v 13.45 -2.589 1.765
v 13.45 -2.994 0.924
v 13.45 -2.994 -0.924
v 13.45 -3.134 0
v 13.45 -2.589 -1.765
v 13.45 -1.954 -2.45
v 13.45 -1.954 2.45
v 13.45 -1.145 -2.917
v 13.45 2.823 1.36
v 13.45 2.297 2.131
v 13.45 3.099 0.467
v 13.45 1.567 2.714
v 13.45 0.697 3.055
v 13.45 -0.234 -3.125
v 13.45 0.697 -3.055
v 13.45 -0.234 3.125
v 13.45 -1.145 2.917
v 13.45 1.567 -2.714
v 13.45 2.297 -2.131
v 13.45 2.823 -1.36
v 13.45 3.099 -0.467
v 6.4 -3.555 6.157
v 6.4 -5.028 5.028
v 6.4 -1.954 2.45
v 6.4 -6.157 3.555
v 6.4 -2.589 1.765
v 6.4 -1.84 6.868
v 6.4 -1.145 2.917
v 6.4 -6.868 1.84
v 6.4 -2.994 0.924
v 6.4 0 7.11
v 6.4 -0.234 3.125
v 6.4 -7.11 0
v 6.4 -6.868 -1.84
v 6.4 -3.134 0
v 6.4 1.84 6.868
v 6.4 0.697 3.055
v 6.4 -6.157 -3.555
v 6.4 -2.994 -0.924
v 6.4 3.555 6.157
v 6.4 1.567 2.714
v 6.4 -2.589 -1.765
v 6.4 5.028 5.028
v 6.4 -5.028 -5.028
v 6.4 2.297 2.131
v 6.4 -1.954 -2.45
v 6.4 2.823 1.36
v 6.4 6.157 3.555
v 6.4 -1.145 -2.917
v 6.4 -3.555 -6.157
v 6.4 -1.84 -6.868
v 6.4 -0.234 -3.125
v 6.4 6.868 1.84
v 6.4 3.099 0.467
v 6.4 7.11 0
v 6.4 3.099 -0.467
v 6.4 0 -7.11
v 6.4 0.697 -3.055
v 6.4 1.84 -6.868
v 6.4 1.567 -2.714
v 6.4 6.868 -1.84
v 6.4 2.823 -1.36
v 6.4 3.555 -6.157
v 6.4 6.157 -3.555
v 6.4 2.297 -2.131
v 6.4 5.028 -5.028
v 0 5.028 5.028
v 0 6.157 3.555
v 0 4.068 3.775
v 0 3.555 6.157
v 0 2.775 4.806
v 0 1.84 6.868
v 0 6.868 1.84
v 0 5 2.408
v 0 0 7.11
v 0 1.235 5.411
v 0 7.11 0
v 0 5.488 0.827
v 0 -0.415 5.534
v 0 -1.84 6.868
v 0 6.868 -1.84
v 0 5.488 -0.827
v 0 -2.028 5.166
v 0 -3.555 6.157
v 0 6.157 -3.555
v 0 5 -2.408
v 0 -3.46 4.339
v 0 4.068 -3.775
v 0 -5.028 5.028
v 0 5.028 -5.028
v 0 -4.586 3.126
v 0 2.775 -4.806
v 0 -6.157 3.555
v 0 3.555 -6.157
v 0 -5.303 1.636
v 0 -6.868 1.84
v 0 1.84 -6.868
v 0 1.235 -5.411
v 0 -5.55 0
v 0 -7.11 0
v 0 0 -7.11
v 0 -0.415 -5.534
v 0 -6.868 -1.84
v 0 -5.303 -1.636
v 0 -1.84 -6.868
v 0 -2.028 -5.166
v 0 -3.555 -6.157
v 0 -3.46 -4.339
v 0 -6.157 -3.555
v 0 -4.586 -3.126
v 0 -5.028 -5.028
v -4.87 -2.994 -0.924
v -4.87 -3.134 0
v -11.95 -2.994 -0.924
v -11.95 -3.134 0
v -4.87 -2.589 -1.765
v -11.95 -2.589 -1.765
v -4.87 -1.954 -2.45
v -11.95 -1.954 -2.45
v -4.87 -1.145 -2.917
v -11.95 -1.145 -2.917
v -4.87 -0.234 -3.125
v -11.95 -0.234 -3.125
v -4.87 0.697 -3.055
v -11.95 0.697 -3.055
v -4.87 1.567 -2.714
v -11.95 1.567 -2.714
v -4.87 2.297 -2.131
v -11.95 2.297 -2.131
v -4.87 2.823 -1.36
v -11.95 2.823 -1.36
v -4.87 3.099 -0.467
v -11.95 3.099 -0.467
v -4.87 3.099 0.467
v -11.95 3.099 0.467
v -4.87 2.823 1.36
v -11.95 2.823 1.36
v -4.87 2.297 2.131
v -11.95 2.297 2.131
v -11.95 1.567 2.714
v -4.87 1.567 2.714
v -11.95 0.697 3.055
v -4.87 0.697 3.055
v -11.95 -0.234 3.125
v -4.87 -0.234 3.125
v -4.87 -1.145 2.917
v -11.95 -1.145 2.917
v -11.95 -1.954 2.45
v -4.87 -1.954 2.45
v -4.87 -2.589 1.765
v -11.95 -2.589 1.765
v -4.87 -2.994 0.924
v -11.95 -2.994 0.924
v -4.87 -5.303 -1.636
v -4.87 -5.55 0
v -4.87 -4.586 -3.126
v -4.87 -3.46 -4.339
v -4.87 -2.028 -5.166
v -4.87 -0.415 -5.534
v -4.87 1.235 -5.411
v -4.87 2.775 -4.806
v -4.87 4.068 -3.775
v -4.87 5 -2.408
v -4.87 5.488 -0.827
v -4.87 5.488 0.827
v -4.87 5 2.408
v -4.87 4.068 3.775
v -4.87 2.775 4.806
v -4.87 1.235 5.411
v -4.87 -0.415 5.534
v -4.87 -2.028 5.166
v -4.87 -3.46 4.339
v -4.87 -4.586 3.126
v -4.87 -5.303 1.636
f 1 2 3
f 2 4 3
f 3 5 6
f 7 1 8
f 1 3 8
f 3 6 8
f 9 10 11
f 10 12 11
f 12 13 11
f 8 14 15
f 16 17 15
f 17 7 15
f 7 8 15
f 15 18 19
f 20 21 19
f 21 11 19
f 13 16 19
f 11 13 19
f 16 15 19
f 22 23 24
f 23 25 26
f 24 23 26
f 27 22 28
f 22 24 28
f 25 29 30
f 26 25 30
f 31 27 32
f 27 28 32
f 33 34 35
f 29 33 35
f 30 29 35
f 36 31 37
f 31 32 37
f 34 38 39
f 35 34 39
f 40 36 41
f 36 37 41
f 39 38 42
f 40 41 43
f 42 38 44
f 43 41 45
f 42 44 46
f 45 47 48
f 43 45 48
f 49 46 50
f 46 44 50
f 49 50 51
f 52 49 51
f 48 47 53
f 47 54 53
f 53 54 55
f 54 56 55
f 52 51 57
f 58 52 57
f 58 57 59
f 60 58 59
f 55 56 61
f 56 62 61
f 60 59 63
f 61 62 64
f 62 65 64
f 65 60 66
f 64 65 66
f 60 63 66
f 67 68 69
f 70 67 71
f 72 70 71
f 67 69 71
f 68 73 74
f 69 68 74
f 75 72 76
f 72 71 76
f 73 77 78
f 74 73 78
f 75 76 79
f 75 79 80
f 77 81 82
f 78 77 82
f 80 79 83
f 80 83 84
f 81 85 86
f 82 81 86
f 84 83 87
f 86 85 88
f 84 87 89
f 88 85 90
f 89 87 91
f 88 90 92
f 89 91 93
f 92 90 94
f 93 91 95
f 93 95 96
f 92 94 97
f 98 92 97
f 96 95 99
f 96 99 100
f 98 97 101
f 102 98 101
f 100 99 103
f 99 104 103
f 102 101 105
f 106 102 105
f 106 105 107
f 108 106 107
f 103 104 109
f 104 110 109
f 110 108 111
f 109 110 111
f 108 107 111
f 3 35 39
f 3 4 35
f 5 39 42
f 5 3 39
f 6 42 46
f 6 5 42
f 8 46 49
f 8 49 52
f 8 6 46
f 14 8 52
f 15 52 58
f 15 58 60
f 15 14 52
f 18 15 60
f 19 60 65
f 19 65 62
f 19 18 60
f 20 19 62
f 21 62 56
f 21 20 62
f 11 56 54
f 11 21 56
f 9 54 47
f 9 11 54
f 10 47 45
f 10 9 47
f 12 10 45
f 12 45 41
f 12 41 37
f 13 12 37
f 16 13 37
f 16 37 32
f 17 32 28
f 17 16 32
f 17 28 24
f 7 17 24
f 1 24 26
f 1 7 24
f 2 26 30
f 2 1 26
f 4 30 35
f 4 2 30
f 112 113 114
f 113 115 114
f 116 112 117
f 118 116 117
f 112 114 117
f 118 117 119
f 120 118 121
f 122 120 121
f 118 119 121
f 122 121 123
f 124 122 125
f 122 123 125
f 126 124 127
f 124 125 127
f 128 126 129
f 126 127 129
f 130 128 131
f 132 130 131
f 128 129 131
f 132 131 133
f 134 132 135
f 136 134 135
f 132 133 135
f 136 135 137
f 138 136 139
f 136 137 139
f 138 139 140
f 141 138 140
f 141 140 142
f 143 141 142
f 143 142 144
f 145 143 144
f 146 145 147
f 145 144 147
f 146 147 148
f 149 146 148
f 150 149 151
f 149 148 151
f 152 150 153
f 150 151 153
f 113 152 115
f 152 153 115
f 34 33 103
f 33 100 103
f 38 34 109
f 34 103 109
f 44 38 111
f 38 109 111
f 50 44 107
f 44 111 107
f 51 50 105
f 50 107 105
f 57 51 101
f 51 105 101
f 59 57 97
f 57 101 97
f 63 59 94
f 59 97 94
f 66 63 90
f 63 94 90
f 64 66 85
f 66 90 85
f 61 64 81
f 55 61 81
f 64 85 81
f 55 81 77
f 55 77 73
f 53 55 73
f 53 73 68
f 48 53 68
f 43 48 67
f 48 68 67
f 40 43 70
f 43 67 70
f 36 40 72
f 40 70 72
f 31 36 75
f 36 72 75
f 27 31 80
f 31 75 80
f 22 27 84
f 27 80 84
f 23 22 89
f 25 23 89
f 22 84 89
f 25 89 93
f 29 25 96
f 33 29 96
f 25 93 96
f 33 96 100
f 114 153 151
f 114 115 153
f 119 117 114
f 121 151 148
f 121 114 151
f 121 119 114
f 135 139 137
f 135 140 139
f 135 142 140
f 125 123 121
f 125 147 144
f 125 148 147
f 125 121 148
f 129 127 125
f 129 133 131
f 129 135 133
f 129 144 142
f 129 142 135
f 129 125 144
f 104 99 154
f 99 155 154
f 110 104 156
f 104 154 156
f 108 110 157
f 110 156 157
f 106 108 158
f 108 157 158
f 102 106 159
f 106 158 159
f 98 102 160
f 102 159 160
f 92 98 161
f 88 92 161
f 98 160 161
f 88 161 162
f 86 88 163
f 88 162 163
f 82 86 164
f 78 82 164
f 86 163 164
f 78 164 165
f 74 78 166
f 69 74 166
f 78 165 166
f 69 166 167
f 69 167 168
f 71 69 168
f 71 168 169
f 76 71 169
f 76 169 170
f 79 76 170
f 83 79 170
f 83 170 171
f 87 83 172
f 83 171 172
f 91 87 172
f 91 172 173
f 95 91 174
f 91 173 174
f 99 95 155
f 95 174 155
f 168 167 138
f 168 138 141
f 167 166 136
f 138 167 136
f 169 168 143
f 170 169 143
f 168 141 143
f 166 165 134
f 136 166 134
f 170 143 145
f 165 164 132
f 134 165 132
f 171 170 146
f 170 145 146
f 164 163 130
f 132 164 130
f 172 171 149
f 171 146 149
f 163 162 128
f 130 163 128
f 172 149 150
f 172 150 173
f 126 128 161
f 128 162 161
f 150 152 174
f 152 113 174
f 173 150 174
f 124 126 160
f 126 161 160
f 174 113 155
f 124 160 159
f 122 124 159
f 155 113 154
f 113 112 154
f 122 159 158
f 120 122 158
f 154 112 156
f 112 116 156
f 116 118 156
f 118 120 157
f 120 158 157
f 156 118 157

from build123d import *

# Parameters (mm, degrees)
SKETCH1_W   = 7.08
SKETCH1_H   = 3.133597909
SKETCH1_W_2 = 11.27
SKETCH1_W_3 = 7.05


with BuildPart() as part:
    # Sketch1 → Revolve1 (revolve)
    with BuildSketch(Plane.XY, mode=Mode.PRIVATE) as revolve1_sk:
        with Locations((-8.41, 1.566798955)):
            Rectangle(SKETCH1_W, SKETCH1_H)
        with Locations((0.765, 1.566798955)):
            Rectangle(SKETCH1_W_2, SKETCH1_H)
        Polygon((6.4, 7.11), (0, 7.11), (0, 5.55), (-4.87, 5.55), (-4.87, 3.133597909), (6.4, 3.133597909), align=None)
        with Locations((9.925, 1.566798955)):
            Rectangle(SKETCH1_W_3, SKETCH1_H)
    revolve(revolve1_sk.sketch.rotate(Axis((-4.87, 0, 0), (1, 0, 0)), 180), axis=Axis((-4.87, 0, 0), (1, 0, 0)))


solid = part.part
